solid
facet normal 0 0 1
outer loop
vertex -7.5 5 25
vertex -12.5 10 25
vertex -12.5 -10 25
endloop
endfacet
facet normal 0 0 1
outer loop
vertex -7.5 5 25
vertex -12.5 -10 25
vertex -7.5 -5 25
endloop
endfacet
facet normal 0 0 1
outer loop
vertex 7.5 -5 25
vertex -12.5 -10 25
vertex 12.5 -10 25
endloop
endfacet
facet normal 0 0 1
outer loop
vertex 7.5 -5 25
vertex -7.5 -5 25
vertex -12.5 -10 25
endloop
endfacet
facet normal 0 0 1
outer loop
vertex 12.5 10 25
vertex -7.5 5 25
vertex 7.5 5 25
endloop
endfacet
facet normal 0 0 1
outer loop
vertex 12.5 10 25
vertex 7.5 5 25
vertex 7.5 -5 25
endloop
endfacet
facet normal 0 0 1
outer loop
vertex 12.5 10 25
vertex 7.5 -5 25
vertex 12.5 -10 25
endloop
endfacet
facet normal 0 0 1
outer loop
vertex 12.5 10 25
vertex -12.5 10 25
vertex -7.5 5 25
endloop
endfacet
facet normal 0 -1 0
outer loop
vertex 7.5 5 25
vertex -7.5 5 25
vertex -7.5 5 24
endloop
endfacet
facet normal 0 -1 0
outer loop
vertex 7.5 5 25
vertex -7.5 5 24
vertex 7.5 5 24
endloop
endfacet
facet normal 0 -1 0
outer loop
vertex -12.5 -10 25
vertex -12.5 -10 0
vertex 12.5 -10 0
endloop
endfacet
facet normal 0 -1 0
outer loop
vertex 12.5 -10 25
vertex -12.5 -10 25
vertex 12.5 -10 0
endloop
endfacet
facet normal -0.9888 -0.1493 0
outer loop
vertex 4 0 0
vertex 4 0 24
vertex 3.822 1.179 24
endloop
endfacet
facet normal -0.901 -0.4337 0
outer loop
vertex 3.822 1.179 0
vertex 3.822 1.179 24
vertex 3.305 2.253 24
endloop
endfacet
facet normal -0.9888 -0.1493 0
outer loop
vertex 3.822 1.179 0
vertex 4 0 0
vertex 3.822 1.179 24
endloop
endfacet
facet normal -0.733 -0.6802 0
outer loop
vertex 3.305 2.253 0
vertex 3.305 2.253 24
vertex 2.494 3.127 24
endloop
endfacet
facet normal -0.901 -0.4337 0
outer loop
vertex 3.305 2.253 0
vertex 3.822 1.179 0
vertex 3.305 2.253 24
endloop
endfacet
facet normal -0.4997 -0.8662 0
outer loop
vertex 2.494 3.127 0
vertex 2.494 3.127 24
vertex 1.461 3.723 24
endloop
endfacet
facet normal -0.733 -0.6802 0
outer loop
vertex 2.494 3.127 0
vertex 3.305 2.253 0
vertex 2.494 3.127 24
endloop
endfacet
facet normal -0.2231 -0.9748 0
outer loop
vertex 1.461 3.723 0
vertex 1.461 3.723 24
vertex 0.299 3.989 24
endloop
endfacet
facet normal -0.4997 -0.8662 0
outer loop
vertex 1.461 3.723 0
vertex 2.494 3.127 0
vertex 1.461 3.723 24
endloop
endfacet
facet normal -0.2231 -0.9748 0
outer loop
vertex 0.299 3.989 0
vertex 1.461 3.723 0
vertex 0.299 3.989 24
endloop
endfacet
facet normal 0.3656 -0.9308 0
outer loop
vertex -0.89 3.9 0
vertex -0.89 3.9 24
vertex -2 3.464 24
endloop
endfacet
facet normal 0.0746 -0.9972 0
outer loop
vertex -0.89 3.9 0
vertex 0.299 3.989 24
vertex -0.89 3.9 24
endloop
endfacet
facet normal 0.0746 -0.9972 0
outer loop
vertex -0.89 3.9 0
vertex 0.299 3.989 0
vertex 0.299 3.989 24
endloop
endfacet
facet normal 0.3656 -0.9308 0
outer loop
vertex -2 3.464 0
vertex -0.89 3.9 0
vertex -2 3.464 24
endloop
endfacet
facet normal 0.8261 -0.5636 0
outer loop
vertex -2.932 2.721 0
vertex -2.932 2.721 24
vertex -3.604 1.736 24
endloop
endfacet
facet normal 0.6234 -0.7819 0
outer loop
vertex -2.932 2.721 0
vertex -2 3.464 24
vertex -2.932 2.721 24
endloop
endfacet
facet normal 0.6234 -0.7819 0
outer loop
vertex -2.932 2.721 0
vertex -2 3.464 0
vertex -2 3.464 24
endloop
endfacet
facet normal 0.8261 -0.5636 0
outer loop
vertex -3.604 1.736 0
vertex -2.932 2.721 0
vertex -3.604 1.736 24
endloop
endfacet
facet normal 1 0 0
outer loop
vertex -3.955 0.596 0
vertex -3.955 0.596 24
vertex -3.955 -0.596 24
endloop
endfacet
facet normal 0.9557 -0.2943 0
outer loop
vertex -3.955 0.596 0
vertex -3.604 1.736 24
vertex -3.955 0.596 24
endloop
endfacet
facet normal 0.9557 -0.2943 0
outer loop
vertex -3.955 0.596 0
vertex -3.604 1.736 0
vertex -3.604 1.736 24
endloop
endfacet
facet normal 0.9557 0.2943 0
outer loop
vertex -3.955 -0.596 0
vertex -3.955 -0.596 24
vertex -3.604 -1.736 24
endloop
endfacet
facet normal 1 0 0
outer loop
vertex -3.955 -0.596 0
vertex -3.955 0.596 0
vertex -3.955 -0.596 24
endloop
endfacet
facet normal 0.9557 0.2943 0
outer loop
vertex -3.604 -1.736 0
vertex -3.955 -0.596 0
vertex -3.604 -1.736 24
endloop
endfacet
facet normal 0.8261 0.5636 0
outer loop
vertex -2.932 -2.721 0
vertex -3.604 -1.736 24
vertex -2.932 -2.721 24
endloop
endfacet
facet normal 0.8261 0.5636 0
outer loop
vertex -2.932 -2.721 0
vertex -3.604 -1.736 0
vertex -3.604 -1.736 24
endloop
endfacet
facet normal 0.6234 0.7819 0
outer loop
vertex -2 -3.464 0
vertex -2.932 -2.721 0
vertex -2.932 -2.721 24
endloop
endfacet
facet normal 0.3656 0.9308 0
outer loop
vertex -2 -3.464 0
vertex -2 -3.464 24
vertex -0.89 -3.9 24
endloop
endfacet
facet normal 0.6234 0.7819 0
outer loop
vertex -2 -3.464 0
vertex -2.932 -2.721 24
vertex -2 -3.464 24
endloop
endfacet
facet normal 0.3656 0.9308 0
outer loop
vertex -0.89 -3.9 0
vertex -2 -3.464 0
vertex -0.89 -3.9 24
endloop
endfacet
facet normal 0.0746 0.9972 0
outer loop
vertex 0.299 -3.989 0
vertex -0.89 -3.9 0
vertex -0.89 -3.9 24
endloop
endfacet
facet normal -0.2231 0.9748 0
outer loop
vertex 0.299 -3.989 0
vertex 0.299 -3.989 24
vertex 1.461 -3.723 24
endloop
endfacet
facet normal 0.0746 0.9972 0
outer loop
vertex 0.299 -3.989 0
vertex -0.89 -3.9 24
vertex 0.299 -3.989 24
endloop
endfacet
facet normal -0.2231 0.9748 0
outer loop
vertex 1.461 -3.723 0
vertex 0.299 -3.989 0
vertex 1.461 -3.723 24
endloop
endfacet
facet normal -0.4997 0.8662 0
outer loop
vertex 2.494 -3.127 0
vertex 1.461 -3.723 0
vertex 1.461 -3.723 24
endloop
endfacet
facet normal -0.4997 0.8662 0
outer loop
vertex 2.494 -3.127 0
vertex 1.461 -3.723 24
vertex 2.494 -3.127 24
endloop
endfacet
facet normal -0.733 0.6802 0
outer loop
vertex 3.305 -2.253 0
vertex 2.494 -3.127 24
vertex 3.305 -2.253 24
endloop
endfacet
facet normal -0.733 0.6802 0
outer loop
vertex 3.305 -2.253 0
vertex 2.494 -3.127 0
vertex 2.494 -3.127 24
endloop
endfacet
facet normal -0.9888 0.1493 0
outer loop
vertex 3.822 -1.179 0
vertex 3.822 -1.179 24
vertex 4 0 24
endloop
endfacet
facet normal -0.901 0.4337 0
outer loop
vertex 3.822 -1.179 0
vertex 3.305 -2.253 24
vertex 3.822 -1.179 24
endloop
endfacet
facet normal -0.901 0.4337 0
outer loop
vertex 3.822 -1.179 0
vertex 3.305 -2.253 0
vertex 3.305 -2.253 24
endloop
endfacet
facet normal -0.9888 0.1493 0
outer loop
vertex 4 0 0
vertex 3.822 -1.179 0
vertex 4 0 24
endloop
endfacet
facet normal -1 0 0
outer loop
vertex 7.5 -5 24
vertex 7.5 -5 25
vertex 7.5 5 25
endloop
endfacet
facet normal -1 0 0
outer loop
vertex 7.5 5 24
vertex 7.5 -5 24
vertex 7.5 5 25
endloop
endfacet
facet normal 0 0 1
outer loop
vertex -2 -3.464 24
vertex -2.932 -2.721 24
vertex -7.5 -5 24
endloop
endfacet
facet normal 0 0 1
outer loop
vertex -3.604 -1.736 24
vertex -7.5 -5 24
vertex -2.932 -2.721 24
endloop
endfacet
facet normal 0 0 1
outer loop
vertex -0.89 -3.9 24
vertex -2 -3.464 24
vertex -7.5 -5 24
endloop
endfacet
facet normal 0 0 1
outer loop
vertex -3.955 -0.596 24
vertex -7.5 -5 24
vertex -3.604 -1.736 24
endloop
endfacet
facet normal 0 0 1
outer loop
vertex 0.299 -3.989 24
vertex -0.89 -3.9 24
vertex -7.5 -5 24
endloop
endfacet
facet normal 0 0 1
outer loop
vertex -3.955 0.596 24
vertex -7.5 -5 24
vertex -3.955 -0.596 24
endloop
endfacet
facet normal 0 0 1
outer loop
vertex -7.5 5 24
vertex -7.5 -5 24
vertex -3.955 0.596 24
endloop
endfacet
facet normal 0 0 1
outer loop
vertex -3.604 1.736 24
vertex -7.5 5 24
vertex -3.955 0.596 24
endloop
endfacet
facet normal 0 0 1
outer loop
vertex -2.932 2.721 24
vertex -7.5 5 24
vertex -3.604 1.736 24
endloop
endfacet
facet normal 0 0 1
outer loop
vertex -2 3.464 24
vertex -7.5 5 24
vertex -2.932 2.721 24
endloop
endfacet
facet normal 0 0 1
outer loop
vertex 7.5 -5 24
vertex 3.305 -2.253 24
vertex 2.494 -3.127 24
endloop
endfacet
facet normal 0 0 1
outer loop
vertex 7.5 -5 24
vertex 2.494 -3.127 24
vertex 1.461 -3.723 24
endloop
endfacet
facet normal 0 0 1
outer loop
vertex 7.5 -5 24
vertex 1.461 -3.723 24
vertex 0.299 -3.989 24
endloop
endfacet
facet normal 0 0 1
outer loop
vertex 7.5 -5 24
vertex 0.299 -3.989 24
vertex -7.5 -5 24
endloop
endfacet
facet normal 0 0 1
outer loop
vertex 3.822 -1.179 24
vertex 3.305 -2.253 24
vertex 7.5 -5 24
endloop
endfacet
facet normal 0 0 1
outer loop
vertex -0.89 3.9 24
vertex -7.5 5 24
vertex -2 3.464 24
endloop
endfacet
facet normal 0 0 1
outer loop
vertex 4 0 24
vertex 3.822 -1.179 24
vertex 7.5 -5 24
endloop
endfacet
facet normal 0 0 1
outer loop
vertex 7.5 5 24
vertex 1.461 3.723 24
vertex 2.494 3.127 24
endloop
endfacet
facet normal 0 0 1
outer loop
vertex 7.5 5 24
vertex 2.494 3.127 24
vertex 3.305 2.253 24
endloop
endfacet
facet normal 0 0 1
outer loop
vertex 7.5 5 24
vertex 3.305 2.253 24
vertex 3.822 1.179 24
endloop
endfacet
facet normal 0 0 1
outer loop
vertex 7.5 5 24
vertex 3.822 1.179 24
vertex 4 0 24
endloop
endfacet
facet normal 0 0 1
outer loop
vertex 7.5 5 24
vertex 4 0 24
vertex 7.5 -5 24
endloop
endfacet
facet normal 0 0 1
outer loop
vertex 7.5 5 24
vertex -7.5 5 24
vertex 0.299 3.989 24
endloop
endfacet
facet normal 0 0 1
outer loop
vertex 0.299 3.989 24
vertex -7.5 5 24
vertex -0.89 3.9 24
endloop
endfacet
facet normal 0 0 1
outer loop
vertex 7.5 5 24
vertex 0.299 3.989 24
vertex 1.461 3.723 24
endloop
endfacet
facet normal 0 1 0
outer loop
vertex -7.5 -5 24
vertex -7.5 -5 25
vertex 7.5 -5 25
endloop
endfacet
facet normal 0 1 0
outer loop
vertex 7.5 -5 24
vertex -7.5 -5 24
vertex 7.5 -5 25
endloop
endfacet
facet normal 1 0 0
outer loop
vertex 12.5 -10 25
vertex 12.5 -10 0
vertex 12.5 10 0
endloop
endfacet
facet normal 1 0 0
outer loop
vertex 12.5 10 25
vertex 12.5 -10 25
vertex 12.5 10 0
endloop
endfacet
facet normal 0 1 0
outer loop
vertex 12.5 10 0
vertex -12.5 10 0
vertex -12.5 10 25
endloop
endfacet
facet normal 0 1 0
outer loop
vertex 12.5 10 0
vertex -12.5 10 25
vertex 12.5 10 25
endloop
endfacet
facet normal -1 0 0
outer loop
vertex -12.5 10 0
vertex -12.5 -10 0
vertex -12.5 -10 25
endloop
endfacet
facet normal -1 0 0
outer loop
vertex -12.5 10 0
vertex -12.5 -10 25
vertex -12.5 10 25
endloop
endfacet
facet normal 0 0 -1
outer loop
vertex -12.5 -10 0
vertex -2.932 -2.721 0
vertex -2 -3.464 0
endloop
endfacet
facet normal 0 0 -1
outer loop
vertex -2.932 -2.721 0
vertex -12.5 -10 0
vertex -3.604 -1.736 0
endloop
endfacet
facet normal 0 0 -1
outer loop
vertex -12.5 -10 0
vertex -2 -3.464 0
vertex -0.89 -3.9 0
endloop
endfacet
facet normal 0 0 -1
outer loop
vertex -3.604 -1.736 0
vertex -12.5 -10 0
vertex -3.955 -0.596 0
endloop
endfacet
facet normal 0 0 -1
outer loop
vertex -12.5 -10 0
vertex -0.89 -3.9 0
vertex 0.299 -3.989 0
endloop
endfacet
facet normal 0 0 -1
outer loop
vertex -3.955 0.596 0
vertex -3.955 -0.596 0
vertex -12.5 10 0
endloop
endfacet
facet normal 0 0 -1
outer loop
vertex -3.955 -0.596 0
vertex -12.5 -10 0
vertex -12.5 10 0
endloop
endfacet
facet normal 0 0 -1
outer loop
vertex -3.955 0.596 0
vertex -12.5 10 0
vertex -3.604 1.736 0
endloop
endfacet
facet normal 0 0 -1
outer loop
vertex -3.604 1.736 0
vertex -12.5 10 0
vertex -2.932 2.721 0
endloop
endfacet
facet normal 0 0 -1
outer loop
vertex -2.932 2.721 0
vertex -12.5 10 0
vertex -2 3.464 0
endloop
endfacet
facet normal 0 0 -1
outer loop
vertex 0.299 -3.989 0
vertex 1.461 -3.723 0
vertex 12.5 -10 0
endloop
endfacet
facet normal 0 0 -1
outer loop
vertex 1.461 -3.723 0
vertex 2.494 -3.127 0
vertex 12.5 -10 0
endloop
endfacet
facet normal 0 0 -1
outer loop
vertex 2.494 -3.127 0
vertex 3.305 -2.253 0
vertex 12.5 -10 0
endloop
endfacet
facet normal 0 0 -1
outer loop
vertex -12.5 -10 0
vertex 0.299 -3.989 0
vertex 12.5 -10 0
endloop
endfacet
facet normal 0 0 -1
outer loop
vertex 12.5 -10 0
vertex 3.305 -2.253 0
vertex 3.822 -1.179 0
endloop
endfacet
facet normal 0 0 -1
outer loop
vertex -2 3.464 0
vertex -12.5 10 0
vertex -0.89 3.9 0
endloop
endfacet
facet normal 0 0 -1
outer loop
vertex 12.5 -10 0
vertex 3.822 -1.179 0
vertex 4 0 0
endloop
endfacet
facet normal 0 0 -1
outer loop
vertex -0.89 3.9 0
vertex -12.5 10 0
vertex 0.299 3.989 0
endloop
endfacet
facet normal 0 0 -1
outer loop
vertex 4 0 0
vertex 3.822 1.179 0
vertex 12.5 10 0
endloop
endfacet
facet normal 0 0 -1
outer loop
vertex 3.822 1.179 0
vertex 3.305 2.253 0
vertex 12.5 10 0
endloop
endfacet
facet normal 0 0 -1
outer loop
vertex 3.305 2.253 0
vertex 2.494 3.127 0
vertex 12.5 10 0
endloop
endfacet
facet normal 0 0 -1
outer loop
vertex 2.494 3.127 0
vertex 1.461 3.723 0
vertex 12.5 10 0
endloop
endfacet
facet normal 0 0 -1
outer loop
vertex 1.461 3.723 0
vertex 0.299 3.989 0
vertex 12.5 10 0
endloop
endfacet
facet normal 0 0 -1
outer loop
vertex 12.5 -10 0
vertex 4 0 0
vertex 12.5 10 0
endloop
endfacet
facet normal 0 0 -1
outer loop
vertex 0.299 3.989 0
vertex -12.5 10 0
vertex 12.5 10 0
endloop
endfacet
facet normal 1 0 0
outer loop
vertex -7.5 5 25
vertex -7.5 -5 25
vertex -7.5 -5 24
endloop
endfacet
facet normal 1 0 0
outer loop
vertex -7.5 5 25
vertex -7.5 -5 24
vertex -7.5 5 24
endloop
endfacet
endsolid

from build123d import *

# Parameters (mm, degrees)
F0_W     = 25
F0_H     = 20
F0_R     = 4
F1_DEPTH = 25
F2_W     = 15
F2_H     = 10
F3_DEPTH = 1


with BuildPart() as f1:
    # F0 (on Top) → F1 (new body)
    with BuildSketch(Plane.XY):
        Rectangle(F0_W, F0_H)
        Circle(F0_R, mode=Mode.SUBTRACT)
    extrude(amount=F1_DEPTH)

    # F2 (on face) → F3 (cut)
    with BuildSketch(Plane.XY.offset(25)):
        Rectangle(F2_W, F2_H)
    extrude(amount=-F3_DEPTH, mode=Mode.SUBTRACT)


solid = f1.part
